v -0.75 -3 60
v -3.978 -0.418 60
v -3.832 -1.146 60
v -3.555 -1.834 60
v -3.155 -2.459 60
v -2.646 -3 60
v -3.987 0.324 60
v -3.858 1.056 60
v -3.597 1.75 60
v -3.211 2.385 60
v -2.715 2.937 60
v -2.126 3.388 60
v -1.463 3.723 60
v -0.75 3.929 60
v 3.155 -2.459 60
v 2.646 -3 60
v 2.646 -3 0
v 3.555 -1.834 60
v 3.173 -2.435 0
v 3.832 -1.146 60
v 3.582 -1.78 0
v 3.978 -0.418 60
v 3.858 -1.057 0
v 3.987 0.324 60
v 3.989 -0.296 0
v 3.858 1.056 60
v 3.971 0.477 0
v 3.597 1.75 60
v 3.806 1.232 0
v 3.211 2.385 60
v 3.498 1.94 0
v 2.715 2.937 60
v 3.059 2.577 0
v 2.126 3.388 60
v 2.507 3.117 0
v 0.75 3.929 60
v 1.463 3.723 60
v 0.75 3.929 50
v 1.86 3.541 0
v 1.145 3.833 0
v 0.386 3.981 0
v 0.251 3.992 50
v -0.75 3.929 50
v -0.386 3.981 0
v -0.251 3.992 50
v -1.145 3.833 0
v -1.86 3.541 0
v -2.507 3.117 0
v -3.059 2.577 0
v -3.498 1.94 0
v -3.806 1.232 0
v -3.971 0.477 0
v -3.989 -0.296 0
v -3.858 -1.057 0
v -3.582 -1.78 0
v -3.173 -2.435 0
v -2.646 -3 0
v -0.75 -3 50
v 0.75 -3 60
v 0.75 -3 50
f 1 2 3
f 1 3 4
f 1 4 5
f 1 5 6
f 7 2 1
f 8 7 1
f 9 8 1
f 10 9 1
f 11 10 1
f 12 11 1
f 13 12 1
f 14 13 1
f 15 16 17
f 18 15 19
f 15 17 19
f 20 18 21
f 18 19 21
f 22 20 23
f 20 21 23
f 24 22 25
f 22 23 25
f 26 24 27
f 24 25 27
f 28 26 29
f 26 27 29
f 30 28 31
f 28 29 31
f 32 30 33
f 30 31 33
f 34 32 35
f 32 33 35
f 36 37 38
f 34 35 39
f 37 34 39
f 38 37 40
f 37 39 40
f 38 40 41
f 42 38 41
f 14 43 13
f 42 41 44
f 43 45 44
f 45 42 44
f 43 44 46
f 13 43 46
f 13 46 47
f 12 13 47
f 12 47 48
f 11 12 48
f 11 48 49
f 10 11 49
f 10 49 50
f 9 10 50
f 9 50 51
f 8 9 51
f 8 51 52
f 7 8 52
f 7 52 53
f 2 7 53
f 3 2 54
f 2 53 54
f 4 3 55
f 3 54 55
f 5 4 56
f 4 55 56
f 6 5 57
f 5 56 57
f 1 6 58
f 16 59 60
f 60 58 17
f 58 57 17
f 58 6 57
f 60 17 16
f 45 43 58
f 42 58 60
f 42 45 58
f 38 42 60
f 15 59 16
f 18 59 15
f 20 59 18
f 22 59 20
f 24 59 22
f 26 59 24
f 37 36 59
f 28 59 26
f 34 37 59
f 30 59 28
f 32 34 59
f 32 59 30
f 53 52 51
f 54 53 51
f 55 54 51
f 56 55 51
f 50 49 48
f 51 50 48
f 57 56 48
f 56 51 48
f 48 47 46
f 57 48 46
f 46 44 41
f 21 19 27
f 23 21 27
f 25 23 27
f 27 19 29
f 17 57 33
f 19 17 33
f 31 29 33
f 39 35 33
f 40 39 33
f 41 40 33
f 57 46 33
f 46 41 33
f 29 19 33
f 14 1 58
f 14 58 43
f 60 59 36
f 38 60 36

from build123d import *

# Parameters (mm, degrees)
BOSS_EXTRUDE1_DEPTH = 60
SKETCH2_W           = 1.5
SKETCH2_H           = 8
CUT_EXTRUDE1_DEPTH  = 10


with BuildPart() as part:
    # Sketch1 → Boss-Extrude1 (new body)
    with BuildSketch(Plane.XY):
        with BuildLine():
            Line((-2.645751311, -3), (2.645751311, -3))
            ThreePointArc((2.645751311, -3), (0, 4), (-2.645751311, -3))
        make_face()
    extrude(amount=BOSS_EXTRUDE1_DEPTH)

    # Sketch2 → Cut-Extrude1 (cut)
    with BuildSketch(Plane.XY.offset(60)):
        Rectangle(SKETCH2_W, SKETCH2_H)
    extrude(amount=-CUT_EXTRUDE1_DEPTH, mode=Mode.SUBTRACT)


solid = part.part
